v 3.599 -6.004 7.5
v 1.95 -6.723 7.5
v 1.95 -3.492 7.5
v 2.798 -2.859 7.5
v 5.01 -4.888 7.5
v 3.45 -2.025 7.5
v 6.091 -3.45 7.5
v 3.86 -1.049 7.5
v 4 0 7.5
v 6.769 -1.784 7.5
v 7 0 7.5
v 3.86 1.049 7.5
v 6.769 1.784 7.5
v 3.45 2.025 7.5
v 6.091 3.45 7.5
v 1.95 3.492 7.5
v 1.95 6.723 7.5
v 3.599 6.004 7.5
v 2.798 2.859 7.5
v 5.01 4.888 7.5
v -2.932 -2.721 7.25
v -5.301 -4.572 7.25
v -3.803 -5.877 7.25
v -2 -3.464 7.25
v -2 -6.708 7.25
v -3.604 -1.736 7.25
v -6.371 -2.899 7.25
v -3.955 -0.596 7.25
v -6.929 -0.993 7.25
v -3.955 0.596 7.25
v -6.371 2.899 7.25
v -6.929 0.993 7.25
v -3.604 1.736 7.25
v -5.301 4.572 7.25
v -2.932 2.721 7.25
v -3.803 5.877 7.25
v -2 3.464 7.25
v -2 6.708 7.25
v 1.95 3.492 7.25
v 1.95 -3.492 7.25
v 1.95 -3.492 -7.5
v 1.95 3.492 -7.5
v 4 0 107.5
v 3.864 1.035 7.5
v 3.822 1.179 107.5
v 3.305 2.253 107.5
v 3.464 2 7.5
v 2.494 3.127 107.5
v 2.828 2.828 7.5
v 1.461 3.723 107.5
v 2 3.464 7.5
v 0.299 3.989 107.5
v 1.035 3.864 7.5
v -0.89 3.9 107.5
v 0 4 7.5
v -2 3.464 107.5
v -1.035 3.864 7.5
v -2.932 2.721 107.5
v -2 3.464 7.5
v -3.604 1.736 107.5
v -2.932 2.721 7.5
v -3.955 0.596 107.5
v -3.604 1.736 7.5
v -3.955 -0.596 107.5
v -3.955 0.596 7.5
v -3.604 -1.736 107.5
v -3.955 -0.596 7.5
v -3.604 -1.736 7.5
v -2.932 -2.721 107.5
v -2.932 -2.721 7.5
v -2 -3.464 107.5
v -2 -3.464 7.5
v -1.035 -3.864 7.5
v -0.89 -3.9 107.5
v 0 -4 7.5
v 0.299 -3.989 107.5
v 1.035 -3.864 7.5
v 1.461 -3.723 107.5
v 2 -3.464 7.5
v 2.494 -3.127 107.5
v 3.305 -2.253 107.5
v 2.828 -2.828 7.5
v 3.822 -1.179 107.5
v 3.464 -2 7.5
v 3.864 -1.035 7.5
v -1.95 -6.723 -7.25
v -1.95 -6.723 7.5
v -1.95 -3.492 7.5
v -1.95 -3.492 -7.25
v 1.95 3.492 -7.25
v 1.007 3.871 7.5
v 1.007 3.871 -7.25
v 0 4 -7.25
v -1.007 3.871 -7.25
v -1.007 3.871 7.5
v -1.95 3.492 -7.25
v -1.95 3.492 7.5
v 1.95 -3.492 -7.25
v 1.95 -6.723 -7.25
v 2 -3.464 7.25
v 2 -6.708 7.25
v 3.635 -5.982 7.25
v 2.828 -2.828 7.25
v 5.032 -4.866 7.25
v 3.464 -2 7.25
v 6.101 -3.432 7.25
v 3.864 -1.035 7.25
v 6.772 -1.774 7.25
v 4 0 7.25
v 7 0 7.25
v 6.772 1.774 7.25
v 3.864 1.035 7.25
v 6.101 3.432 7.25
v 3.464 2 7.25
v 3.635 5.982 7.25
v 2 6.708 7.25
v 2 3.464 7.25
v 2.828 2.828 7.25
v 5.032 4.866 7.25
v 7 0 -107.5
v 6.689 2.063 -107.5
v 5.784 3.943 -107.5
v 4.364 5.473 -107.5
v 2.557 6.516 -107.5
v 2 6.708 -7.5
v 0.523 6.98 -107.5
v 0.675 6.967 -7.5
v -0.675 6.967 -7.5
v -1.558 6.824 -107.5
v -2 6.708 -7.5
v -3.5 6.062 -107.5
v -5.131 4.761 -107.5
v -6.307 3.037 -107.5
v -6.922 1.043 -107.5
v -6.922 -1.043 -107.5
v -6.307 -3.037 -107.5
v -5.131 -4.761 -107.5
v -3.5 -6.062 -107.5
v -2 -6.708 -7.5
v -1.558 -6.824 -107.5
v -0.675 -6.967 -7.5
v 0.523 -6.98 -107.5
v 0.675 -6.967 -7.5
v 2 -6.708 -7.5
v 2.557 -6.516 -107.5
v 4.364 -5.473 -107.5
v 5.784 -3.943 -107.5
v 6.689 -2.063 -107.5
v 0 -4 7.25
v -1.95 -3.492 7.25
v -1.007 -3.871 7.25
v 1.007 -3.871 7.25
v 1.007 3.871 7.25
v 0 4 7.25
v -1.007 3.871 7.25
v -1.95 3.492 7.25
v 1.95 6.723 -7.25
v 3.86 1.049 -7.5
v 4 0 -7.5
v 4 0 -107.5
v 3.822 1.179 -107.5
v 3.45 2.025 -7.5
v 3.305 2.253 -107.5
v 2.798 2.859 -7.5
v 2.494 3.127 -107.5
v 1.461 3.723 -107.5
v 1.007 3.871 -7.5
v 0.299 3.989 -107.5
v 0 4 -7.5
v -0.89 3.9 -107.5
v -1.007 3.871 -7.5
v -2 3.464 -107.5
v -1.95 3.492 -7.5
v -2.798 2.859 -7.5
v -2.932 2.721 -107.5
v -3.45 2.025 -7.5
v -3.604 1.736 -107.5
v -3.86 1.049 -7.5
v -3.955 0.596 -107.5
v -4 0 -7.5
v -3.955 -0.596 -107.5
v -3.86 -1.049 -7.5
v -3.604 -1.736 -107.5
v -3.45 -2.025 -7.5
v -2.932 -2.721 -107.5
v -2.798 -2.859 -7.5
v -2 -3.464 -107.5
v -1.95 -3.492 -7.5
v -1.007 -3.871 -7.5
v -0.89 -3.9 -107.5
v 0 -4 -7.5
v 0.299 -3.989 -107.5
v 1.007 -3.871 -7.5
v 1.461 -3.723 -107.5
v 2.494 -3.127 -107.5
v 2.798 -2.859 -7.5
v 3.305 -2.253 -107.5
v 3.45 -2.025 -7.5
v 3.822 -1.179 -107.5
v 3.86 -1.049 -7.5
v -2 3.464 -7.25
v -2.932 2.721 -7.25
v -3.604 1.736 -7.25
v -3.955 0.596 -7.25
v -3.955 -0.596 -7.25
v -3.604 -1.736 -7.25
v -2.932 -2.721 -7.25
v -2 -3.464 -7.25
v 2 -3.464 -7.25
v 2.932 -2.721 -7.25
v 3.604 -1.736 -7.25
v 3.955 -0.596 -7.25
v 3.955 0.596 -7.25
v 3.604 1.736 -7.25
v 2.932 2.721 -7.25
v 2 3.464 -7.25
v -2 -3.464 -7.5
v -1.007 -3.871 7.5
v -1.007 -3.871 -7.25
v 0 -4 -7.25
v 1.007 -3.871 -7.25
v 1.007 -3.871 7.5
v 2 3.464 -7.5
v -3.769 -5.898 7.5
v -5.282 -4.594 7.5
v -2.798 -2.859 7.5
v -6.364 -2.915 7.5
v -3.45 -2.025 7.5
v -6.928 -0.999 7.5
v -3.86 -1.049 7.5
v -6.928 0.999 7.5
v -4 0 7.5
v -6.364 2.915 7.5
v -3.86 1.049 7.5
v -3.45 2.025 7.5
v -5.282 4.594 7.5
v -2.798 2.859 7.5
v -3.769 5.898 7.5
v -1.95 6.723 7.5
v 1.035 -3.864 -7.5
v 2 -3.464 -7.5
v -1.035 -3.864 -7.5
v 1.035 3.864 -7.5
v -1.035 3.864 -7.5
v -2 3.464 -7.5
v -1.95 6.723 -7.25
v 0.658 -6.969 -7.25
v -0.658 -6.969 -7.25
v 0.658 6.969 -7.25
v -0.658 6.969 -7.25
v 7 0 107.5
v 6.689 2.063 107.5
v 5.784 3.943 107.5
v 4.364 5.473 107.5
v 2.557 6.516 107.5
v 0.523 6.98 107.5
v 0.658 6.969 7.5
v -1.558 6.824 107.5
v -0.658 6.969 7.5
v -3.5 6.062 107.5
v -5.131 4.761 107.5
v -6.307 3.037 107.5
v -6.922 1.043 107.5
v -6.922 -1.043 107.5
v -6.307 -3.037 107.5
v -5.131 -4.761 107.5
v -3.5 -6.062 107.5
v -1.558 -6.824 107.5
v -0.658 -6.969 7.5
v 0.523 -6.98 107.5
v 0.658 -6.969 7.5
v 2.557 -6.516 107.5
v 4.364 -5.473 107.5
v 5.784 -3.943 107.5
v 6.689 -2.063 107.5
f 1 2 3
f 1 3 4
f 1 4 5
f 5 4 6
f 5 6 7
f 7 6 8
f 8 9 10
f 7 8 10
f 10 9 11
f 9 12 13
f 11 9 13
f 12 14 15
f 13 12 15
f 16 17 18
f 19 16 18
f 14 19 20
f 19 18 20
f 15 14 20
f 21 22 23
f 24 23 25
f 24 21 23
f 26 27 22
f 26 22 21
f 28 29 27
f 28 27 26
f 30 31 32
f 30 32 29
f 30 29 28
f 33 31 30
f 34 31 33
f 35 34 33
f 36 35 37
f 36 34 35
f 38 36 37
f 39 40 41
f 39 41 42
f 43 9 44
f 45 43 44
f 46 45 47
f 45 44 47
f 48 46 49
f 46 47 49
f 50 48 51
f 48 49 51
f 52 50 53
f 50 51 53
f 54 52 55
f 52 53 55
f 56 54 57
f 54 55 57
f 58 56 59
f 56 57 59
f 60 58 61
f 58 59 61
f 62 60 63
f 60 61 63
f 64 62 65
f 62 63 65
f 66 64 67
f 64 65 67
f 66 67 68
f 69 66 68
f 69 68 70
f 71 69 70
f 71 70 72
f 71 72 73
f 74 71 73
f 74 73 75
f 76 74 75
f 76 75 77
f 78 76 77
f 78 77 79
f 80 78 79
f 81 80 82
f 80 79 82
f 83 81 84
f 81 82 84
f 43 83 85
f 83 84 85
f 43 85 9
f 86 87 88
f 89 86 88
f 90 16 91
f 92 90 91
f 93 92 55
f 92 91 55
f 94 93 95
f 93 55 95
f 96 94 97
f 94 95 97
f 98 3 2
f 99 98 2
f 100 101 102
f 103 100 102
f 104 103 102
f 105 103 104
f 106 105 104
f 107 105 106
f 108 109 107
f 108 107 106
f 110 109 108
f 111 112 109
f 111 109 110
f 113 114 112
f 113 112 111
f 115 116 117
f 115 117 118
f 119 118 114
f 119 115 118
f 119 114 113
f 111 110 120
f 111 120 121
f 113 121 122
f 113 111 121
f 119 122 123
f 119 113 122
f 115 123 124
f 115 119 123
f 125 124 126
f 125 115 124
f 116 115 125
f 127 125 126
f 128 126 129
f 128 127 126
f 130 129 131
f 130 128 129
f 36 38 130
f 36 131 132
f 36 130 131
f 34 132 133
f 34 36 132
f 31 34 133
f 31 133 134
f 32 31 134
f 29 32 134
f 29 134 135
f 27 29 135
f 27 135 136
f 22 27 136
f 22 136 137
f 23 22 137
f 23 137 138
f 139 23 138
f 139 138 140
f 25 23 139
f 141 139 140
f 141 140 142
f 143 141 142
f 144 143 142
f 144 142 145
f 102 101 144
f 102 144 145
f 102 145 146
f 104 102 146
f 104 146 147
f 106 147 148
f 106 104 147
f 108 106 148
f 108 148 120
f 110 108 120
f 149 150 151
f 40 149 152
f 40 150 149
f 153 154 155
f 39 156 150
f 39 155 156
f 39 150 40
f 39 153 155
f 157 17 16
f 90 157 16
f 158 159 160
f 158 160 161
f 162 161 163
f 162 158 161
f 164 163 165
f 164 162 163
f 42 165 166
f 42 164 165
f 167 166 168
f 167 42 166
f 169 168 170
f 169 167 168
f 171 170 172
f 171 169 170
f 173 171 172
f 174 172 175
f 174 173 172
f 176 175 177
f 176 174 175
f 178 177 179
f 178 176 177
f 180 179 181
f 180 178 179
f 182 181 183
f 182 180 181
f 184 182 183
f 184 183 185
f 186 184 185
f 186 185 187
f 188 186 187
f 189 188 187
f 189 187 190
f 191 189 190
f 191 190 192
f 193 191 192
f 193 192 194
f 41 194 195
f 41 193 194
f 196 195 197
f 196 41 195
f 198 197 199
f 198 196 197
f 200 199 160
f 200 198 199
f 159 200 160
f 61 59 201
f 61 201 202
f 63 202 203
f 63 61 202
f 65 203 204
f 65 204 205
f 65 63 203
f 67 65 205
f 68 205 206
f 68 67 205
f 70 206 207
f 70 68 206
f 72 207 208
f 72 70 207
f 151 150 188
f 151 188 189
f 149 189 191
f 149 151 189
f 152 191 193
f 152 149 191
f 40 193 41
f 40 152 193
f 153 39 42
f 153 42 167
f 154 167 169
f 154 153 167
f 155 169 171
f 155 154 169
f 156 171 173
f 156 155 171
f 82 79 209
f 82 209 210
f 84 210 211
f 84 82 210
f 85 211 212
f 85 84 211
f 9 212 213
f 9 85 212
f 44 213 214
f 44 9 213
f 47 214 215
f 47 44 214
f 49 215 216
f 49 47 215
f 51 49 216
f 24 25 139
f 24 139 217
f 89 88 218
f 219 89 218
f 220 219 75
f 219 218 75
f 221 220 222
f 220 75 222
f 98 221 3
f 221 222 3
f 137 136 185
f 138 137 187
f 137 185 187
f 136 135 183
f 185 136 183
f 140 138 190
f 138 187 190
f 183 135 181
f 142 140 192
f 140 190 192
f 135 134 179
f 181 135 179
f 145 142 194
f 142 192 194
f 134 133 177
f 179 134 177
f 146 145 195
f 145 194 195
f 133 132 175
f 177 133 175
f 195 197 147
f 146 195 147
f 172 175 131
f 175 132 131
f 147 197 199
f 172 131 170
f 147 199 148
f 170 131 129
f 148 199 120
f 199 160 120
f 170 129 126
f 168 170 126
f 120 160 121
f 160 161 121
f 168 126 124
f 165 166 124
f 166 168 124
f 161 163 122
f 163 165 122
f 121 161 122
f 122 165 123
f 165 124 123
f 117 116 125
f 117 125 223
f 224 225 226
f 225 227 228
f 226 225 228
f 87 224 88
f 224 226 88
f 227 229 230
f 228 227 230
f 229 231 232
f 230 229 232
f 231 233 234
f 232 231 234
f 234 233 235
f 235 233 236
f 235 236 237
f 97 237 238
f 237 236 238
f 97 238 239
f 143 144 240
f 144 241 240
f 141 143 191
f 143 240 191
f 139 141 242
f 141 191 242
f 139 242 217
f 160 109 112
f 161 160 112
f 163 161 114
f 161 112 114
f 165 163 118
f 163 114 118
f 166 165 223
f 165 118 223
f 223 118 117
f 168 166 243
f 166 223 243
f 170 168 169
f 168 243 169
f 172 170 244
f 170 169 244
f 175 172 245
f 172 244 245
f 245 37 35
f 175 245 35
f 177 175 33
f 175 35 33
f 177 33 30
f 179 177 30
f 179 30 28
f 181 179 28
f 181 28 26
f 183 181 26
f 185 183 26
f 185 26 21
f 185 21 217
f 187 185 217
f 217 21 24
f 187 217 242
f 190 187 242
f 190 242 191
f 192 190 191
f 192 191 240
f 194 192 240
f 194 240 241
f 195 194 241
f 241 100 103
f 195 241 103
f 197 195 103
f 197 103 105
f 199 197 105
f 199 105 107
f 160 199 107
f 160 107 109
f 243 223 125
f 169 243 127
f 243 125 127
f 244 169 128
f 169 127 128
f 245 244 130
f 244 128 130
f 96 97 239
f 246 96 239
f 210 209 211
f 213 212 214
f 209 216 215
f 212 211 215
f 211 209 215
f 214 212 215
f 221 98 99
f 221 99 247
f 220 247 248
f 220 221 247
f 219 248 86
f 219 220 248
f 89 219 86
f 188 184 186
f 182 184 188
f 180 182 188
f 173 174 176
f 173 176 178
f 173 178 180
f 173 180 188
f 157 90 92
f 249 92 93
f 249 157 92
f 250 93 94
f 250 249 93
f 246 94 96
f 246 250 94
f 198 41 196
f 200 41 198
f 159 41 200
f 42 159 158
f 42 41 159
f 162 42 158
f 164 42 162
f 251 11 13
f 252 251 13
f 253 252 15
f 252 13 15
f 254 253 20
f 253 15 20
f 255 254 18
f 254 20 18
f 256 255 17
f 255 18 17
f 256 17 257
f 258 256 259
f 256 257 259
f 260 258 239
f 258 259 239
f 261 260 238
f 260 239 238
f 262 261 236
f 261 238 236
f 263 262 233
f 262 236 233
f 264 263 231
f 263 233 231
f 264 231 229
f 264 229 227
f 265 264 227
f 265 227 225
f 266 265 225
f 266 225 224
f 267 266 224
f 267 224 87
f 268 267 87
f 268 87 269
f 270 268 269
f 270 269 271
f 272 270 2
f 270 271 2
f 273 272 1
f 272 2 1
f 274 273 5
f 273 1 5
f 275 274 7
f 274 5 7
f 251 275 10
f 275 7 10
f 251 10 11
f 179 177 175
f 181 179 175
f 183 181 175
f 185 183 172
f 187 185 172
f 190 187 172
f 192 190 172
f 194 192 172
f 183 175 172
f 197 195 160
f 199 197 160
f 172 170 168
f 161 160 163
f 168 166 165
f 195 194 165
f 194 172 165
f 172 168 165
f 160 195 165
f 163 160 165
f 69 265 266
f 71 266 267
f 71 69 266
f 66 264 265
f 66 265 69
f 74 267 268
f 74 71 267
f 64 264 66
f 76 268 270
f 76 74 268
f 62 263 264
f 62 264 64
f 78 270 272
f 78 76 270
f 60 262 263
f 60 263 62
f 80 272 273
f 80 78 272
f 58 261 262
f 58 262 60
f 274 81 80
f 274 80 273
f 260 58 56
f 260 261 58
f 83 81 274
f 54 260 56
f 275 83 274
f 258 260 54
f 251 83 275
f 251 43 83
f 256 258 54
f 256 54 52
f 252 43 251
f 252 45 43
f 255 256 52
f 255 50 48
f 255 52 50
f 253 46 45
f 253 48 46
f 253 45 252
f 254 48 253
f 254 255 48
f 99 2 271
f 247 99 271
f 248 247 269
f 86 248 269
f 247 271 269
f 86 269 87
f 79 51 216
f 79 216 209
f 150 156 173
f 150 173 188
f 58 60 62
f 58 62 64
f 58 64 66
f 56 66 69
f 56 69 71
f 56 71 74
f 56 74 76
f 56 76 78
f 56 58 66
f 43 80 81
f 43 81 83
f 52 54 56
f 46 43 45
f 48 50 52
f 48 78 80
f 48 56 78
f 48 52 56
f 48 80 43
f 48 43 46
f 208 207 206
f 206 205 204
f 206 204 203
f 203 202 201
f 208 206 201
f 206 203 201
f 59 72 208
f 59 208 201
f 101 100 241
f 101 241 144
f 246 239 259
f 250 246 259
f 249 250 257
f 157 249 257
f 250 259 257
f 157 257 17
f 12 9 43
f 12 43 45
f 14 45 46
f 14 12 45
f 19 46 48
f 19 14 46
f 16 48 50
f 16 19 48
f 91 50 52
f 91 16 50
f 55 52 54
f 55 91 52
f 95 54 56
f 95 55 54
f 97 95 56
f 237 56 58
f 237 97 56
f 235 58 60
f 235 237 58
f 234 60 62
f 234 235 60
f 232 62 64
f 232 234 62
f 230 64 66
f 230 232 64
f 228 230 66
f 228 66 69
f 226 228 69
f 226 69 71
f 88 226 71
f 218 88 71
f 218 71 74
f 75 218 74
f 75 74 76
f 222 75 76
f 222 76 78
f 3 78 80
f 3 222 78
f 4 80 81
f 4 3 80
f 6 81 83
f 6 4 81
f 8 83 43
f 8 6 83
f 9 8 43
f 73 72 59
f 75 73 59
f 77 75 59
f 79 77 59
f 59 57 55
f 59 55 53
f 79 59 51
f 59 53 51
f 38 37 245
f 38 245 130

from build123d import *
from build123d.topology import SkipClean

# Parameters (mm, degrees)
SKETCH1_R           = 7
SKETCH1_R_2         = 4
BOSS_EXTRUDE1_DEPTH = 100
SKETCH2_R           = 7
SKETCH2_R_2         = 4
BOSS_EXTRUDE2_DEPTH = 100
BOSS_EXTRUDE3_START = 14.75
SKETCH3_R           = 7
SKETCH3_R_2         = 4
BOSS_EXTRUDE3_DEPTH = 14.75
CUT_EXTRUDE1_START  = 15
CUT_EXTRUDE1_DEPTH  = 15
BOSS_EXTRUDE4_DEPTH = 14.75
SKETCH6_R           = 4
BOSS_EXTRUDE5_DEPTH = 100
SKETCH7_R           = 4
BOSS_EXTRUDE6_DEPTH = 100
BOSS_EXTRUDE7_DEPTH = 14.75
BOSS_EXTRUDE8_START = 14.75
BOSS_EXTRUDE8_DEPTH = 14.75


with BuildPart() as part:
    # Sketch1 → Boss-Extrude1 (new body)
    with BuildSketch(Plane.XY.offset(-7.5)):
        Circle(SKETCH1_R)
        Circle(SKETCH1_R_2, mode=Mode.SUBTRACT)
    extrude(amount=-BOSS_EXTRUDE1_DEPTH)

    # Sketch3 → Boss-Extrude3 (add)
    with BuildSketch(Plane.XY.offset(-7.5).offset(BOSS_EXTRUDE3_START)):
        Circle(SKETCH3_R)
        Circle(SKETCH3_R_2, mode=Mode.SUBTRACT)
    extrude(amount=-BOSS_EXTRUDE3_DEPTH)

    # Sketch4 → Cut-Extrude1 (cut)
    with BuildSketch(Plane.XY.offset(-7.5).offset(CUT_EXTRUDE1_START)):
        with BuildLine():
            Line((-2, -6.708203932), (-2, 6.708203932))
            ThreePointArc((-2, 6.708203932), (0, 7), (2, 6.708203932))
            Line((2, 6.708203932), (2, -6.708203932))
            ThreePointArc((2, -6.708203932), (0, -7), (-2, -6.708203932))
        make_face()
    extrude(amount=-CUT_EXTRUDE1_DEPTH, mode=Mode.SUBTRACT)


with BuildPart() as body_2:
    # Sketch2 → Boss-Extrude2 (new body)
    with BuildSketch(Plane.XY.offset(7.5)):
        Circle(SKETCH2_R)
        Circle(SKETCH2_R_2, mode=Mode.SUBTRACT)
    extrude(amount=BOSS_EXTRUDE2_DEPTH)

    # Sketch5 → Boss-Extrude4 (add)
    with BuildSketch(Plane.XY.offset(7.5)):
        with BuildLine():
            Line((1.95, 6.722908597), (1.95, 3.492491947))
            ThreePointArc((1.95, 3.492491947), (0, 4), (-1.95, 3.492491947))
            Line((-1.95, 3.492491947), (-1.95, 6.722908597))
            ThreePointArc((-1.95, 6.722908597), (0, 7), (1.95, 6.722908597))
        make_face()
        with BuildLine():
            Line((1.95, -3.492491947), (1.95, -6.722908597))
            ThreePointArc((1.95, -6.722908597), (0, -7), (-1.95, -6.722908597))
            Line((-1.95, -6.722908597), (-1.95, -3.492491947))
            ThreePointArc((-1.95, -3.492491947), (0, -4), (1.95, -3.492491947))
        make_face()
    extrude(amount=-BOSS_EXTRUDE4_DEPTH)


with BuildPart() as body_3:
    # Sketch6 → Boss-Extrude5 (new body)
    with BuildSketch(Plane.XY.offset(-7.5)):
        Circle(SKETCH6_R)
    extrude(amount=-BOSS_EXTRUDE5_DEPTH)

    # Sketch9 → Boss-Extrude8 (add)
    with BuildSketch(Plane.XY.offset(-7.5).offset(BOSS_EXTRUDE8_START)):
        with BuildLine():
            Line((-1.95, 3.492491947), (-1.95, -3.492491947))
            ThreePointArc((-1.95, -3.492491947), (0, -4), (1.95, -3.492491947))
            Line((1.95, -3.492491947), (1.95, 3.492491947))
            ThreePointArc((1.95, 3.492491947), (0, 4), (-1.95, 3.492491947))
        make_face()
    extrude(amount=-BOSS_EXTRUDE8_DEPTH)


with BuildPart() as body_4:
    # Sketch7 → Boss-Extrude6 (new body)
    with BuildSketch(Plane.XY.offset(7.5)):
        Circle(SKETCH7_R)
    extrude(amount=BOSS_EXTRUDE6_DEPTH)

    # Sketch8 → Boss-Extrude7 (add)
    with SkipClean():  # the faces are left unmerged after this step: merging them gives an invalid solid
        with BuildSketch(Plane.XY.offset(7.5)):
            with BuildLine():
                Line((2, 3.464101615), (2, -3.464101615))
                ThreePointArc((2, -3.464101615), (4, 0), (2, 3.464101615))
            make_face()
            with BuildLine():
                Line((-2, -3.464101615), (-2, 3.464101615))
                ThreePointArc((-2, 3.464101615), (-4, 0), (-2, -3.464101615))
            make_face()
        extrude(amount=-BOSS_EXTRUDE7_DEPTH)


solid = Compound([part.part, body_2.part, body_3.part, body_4.part])
